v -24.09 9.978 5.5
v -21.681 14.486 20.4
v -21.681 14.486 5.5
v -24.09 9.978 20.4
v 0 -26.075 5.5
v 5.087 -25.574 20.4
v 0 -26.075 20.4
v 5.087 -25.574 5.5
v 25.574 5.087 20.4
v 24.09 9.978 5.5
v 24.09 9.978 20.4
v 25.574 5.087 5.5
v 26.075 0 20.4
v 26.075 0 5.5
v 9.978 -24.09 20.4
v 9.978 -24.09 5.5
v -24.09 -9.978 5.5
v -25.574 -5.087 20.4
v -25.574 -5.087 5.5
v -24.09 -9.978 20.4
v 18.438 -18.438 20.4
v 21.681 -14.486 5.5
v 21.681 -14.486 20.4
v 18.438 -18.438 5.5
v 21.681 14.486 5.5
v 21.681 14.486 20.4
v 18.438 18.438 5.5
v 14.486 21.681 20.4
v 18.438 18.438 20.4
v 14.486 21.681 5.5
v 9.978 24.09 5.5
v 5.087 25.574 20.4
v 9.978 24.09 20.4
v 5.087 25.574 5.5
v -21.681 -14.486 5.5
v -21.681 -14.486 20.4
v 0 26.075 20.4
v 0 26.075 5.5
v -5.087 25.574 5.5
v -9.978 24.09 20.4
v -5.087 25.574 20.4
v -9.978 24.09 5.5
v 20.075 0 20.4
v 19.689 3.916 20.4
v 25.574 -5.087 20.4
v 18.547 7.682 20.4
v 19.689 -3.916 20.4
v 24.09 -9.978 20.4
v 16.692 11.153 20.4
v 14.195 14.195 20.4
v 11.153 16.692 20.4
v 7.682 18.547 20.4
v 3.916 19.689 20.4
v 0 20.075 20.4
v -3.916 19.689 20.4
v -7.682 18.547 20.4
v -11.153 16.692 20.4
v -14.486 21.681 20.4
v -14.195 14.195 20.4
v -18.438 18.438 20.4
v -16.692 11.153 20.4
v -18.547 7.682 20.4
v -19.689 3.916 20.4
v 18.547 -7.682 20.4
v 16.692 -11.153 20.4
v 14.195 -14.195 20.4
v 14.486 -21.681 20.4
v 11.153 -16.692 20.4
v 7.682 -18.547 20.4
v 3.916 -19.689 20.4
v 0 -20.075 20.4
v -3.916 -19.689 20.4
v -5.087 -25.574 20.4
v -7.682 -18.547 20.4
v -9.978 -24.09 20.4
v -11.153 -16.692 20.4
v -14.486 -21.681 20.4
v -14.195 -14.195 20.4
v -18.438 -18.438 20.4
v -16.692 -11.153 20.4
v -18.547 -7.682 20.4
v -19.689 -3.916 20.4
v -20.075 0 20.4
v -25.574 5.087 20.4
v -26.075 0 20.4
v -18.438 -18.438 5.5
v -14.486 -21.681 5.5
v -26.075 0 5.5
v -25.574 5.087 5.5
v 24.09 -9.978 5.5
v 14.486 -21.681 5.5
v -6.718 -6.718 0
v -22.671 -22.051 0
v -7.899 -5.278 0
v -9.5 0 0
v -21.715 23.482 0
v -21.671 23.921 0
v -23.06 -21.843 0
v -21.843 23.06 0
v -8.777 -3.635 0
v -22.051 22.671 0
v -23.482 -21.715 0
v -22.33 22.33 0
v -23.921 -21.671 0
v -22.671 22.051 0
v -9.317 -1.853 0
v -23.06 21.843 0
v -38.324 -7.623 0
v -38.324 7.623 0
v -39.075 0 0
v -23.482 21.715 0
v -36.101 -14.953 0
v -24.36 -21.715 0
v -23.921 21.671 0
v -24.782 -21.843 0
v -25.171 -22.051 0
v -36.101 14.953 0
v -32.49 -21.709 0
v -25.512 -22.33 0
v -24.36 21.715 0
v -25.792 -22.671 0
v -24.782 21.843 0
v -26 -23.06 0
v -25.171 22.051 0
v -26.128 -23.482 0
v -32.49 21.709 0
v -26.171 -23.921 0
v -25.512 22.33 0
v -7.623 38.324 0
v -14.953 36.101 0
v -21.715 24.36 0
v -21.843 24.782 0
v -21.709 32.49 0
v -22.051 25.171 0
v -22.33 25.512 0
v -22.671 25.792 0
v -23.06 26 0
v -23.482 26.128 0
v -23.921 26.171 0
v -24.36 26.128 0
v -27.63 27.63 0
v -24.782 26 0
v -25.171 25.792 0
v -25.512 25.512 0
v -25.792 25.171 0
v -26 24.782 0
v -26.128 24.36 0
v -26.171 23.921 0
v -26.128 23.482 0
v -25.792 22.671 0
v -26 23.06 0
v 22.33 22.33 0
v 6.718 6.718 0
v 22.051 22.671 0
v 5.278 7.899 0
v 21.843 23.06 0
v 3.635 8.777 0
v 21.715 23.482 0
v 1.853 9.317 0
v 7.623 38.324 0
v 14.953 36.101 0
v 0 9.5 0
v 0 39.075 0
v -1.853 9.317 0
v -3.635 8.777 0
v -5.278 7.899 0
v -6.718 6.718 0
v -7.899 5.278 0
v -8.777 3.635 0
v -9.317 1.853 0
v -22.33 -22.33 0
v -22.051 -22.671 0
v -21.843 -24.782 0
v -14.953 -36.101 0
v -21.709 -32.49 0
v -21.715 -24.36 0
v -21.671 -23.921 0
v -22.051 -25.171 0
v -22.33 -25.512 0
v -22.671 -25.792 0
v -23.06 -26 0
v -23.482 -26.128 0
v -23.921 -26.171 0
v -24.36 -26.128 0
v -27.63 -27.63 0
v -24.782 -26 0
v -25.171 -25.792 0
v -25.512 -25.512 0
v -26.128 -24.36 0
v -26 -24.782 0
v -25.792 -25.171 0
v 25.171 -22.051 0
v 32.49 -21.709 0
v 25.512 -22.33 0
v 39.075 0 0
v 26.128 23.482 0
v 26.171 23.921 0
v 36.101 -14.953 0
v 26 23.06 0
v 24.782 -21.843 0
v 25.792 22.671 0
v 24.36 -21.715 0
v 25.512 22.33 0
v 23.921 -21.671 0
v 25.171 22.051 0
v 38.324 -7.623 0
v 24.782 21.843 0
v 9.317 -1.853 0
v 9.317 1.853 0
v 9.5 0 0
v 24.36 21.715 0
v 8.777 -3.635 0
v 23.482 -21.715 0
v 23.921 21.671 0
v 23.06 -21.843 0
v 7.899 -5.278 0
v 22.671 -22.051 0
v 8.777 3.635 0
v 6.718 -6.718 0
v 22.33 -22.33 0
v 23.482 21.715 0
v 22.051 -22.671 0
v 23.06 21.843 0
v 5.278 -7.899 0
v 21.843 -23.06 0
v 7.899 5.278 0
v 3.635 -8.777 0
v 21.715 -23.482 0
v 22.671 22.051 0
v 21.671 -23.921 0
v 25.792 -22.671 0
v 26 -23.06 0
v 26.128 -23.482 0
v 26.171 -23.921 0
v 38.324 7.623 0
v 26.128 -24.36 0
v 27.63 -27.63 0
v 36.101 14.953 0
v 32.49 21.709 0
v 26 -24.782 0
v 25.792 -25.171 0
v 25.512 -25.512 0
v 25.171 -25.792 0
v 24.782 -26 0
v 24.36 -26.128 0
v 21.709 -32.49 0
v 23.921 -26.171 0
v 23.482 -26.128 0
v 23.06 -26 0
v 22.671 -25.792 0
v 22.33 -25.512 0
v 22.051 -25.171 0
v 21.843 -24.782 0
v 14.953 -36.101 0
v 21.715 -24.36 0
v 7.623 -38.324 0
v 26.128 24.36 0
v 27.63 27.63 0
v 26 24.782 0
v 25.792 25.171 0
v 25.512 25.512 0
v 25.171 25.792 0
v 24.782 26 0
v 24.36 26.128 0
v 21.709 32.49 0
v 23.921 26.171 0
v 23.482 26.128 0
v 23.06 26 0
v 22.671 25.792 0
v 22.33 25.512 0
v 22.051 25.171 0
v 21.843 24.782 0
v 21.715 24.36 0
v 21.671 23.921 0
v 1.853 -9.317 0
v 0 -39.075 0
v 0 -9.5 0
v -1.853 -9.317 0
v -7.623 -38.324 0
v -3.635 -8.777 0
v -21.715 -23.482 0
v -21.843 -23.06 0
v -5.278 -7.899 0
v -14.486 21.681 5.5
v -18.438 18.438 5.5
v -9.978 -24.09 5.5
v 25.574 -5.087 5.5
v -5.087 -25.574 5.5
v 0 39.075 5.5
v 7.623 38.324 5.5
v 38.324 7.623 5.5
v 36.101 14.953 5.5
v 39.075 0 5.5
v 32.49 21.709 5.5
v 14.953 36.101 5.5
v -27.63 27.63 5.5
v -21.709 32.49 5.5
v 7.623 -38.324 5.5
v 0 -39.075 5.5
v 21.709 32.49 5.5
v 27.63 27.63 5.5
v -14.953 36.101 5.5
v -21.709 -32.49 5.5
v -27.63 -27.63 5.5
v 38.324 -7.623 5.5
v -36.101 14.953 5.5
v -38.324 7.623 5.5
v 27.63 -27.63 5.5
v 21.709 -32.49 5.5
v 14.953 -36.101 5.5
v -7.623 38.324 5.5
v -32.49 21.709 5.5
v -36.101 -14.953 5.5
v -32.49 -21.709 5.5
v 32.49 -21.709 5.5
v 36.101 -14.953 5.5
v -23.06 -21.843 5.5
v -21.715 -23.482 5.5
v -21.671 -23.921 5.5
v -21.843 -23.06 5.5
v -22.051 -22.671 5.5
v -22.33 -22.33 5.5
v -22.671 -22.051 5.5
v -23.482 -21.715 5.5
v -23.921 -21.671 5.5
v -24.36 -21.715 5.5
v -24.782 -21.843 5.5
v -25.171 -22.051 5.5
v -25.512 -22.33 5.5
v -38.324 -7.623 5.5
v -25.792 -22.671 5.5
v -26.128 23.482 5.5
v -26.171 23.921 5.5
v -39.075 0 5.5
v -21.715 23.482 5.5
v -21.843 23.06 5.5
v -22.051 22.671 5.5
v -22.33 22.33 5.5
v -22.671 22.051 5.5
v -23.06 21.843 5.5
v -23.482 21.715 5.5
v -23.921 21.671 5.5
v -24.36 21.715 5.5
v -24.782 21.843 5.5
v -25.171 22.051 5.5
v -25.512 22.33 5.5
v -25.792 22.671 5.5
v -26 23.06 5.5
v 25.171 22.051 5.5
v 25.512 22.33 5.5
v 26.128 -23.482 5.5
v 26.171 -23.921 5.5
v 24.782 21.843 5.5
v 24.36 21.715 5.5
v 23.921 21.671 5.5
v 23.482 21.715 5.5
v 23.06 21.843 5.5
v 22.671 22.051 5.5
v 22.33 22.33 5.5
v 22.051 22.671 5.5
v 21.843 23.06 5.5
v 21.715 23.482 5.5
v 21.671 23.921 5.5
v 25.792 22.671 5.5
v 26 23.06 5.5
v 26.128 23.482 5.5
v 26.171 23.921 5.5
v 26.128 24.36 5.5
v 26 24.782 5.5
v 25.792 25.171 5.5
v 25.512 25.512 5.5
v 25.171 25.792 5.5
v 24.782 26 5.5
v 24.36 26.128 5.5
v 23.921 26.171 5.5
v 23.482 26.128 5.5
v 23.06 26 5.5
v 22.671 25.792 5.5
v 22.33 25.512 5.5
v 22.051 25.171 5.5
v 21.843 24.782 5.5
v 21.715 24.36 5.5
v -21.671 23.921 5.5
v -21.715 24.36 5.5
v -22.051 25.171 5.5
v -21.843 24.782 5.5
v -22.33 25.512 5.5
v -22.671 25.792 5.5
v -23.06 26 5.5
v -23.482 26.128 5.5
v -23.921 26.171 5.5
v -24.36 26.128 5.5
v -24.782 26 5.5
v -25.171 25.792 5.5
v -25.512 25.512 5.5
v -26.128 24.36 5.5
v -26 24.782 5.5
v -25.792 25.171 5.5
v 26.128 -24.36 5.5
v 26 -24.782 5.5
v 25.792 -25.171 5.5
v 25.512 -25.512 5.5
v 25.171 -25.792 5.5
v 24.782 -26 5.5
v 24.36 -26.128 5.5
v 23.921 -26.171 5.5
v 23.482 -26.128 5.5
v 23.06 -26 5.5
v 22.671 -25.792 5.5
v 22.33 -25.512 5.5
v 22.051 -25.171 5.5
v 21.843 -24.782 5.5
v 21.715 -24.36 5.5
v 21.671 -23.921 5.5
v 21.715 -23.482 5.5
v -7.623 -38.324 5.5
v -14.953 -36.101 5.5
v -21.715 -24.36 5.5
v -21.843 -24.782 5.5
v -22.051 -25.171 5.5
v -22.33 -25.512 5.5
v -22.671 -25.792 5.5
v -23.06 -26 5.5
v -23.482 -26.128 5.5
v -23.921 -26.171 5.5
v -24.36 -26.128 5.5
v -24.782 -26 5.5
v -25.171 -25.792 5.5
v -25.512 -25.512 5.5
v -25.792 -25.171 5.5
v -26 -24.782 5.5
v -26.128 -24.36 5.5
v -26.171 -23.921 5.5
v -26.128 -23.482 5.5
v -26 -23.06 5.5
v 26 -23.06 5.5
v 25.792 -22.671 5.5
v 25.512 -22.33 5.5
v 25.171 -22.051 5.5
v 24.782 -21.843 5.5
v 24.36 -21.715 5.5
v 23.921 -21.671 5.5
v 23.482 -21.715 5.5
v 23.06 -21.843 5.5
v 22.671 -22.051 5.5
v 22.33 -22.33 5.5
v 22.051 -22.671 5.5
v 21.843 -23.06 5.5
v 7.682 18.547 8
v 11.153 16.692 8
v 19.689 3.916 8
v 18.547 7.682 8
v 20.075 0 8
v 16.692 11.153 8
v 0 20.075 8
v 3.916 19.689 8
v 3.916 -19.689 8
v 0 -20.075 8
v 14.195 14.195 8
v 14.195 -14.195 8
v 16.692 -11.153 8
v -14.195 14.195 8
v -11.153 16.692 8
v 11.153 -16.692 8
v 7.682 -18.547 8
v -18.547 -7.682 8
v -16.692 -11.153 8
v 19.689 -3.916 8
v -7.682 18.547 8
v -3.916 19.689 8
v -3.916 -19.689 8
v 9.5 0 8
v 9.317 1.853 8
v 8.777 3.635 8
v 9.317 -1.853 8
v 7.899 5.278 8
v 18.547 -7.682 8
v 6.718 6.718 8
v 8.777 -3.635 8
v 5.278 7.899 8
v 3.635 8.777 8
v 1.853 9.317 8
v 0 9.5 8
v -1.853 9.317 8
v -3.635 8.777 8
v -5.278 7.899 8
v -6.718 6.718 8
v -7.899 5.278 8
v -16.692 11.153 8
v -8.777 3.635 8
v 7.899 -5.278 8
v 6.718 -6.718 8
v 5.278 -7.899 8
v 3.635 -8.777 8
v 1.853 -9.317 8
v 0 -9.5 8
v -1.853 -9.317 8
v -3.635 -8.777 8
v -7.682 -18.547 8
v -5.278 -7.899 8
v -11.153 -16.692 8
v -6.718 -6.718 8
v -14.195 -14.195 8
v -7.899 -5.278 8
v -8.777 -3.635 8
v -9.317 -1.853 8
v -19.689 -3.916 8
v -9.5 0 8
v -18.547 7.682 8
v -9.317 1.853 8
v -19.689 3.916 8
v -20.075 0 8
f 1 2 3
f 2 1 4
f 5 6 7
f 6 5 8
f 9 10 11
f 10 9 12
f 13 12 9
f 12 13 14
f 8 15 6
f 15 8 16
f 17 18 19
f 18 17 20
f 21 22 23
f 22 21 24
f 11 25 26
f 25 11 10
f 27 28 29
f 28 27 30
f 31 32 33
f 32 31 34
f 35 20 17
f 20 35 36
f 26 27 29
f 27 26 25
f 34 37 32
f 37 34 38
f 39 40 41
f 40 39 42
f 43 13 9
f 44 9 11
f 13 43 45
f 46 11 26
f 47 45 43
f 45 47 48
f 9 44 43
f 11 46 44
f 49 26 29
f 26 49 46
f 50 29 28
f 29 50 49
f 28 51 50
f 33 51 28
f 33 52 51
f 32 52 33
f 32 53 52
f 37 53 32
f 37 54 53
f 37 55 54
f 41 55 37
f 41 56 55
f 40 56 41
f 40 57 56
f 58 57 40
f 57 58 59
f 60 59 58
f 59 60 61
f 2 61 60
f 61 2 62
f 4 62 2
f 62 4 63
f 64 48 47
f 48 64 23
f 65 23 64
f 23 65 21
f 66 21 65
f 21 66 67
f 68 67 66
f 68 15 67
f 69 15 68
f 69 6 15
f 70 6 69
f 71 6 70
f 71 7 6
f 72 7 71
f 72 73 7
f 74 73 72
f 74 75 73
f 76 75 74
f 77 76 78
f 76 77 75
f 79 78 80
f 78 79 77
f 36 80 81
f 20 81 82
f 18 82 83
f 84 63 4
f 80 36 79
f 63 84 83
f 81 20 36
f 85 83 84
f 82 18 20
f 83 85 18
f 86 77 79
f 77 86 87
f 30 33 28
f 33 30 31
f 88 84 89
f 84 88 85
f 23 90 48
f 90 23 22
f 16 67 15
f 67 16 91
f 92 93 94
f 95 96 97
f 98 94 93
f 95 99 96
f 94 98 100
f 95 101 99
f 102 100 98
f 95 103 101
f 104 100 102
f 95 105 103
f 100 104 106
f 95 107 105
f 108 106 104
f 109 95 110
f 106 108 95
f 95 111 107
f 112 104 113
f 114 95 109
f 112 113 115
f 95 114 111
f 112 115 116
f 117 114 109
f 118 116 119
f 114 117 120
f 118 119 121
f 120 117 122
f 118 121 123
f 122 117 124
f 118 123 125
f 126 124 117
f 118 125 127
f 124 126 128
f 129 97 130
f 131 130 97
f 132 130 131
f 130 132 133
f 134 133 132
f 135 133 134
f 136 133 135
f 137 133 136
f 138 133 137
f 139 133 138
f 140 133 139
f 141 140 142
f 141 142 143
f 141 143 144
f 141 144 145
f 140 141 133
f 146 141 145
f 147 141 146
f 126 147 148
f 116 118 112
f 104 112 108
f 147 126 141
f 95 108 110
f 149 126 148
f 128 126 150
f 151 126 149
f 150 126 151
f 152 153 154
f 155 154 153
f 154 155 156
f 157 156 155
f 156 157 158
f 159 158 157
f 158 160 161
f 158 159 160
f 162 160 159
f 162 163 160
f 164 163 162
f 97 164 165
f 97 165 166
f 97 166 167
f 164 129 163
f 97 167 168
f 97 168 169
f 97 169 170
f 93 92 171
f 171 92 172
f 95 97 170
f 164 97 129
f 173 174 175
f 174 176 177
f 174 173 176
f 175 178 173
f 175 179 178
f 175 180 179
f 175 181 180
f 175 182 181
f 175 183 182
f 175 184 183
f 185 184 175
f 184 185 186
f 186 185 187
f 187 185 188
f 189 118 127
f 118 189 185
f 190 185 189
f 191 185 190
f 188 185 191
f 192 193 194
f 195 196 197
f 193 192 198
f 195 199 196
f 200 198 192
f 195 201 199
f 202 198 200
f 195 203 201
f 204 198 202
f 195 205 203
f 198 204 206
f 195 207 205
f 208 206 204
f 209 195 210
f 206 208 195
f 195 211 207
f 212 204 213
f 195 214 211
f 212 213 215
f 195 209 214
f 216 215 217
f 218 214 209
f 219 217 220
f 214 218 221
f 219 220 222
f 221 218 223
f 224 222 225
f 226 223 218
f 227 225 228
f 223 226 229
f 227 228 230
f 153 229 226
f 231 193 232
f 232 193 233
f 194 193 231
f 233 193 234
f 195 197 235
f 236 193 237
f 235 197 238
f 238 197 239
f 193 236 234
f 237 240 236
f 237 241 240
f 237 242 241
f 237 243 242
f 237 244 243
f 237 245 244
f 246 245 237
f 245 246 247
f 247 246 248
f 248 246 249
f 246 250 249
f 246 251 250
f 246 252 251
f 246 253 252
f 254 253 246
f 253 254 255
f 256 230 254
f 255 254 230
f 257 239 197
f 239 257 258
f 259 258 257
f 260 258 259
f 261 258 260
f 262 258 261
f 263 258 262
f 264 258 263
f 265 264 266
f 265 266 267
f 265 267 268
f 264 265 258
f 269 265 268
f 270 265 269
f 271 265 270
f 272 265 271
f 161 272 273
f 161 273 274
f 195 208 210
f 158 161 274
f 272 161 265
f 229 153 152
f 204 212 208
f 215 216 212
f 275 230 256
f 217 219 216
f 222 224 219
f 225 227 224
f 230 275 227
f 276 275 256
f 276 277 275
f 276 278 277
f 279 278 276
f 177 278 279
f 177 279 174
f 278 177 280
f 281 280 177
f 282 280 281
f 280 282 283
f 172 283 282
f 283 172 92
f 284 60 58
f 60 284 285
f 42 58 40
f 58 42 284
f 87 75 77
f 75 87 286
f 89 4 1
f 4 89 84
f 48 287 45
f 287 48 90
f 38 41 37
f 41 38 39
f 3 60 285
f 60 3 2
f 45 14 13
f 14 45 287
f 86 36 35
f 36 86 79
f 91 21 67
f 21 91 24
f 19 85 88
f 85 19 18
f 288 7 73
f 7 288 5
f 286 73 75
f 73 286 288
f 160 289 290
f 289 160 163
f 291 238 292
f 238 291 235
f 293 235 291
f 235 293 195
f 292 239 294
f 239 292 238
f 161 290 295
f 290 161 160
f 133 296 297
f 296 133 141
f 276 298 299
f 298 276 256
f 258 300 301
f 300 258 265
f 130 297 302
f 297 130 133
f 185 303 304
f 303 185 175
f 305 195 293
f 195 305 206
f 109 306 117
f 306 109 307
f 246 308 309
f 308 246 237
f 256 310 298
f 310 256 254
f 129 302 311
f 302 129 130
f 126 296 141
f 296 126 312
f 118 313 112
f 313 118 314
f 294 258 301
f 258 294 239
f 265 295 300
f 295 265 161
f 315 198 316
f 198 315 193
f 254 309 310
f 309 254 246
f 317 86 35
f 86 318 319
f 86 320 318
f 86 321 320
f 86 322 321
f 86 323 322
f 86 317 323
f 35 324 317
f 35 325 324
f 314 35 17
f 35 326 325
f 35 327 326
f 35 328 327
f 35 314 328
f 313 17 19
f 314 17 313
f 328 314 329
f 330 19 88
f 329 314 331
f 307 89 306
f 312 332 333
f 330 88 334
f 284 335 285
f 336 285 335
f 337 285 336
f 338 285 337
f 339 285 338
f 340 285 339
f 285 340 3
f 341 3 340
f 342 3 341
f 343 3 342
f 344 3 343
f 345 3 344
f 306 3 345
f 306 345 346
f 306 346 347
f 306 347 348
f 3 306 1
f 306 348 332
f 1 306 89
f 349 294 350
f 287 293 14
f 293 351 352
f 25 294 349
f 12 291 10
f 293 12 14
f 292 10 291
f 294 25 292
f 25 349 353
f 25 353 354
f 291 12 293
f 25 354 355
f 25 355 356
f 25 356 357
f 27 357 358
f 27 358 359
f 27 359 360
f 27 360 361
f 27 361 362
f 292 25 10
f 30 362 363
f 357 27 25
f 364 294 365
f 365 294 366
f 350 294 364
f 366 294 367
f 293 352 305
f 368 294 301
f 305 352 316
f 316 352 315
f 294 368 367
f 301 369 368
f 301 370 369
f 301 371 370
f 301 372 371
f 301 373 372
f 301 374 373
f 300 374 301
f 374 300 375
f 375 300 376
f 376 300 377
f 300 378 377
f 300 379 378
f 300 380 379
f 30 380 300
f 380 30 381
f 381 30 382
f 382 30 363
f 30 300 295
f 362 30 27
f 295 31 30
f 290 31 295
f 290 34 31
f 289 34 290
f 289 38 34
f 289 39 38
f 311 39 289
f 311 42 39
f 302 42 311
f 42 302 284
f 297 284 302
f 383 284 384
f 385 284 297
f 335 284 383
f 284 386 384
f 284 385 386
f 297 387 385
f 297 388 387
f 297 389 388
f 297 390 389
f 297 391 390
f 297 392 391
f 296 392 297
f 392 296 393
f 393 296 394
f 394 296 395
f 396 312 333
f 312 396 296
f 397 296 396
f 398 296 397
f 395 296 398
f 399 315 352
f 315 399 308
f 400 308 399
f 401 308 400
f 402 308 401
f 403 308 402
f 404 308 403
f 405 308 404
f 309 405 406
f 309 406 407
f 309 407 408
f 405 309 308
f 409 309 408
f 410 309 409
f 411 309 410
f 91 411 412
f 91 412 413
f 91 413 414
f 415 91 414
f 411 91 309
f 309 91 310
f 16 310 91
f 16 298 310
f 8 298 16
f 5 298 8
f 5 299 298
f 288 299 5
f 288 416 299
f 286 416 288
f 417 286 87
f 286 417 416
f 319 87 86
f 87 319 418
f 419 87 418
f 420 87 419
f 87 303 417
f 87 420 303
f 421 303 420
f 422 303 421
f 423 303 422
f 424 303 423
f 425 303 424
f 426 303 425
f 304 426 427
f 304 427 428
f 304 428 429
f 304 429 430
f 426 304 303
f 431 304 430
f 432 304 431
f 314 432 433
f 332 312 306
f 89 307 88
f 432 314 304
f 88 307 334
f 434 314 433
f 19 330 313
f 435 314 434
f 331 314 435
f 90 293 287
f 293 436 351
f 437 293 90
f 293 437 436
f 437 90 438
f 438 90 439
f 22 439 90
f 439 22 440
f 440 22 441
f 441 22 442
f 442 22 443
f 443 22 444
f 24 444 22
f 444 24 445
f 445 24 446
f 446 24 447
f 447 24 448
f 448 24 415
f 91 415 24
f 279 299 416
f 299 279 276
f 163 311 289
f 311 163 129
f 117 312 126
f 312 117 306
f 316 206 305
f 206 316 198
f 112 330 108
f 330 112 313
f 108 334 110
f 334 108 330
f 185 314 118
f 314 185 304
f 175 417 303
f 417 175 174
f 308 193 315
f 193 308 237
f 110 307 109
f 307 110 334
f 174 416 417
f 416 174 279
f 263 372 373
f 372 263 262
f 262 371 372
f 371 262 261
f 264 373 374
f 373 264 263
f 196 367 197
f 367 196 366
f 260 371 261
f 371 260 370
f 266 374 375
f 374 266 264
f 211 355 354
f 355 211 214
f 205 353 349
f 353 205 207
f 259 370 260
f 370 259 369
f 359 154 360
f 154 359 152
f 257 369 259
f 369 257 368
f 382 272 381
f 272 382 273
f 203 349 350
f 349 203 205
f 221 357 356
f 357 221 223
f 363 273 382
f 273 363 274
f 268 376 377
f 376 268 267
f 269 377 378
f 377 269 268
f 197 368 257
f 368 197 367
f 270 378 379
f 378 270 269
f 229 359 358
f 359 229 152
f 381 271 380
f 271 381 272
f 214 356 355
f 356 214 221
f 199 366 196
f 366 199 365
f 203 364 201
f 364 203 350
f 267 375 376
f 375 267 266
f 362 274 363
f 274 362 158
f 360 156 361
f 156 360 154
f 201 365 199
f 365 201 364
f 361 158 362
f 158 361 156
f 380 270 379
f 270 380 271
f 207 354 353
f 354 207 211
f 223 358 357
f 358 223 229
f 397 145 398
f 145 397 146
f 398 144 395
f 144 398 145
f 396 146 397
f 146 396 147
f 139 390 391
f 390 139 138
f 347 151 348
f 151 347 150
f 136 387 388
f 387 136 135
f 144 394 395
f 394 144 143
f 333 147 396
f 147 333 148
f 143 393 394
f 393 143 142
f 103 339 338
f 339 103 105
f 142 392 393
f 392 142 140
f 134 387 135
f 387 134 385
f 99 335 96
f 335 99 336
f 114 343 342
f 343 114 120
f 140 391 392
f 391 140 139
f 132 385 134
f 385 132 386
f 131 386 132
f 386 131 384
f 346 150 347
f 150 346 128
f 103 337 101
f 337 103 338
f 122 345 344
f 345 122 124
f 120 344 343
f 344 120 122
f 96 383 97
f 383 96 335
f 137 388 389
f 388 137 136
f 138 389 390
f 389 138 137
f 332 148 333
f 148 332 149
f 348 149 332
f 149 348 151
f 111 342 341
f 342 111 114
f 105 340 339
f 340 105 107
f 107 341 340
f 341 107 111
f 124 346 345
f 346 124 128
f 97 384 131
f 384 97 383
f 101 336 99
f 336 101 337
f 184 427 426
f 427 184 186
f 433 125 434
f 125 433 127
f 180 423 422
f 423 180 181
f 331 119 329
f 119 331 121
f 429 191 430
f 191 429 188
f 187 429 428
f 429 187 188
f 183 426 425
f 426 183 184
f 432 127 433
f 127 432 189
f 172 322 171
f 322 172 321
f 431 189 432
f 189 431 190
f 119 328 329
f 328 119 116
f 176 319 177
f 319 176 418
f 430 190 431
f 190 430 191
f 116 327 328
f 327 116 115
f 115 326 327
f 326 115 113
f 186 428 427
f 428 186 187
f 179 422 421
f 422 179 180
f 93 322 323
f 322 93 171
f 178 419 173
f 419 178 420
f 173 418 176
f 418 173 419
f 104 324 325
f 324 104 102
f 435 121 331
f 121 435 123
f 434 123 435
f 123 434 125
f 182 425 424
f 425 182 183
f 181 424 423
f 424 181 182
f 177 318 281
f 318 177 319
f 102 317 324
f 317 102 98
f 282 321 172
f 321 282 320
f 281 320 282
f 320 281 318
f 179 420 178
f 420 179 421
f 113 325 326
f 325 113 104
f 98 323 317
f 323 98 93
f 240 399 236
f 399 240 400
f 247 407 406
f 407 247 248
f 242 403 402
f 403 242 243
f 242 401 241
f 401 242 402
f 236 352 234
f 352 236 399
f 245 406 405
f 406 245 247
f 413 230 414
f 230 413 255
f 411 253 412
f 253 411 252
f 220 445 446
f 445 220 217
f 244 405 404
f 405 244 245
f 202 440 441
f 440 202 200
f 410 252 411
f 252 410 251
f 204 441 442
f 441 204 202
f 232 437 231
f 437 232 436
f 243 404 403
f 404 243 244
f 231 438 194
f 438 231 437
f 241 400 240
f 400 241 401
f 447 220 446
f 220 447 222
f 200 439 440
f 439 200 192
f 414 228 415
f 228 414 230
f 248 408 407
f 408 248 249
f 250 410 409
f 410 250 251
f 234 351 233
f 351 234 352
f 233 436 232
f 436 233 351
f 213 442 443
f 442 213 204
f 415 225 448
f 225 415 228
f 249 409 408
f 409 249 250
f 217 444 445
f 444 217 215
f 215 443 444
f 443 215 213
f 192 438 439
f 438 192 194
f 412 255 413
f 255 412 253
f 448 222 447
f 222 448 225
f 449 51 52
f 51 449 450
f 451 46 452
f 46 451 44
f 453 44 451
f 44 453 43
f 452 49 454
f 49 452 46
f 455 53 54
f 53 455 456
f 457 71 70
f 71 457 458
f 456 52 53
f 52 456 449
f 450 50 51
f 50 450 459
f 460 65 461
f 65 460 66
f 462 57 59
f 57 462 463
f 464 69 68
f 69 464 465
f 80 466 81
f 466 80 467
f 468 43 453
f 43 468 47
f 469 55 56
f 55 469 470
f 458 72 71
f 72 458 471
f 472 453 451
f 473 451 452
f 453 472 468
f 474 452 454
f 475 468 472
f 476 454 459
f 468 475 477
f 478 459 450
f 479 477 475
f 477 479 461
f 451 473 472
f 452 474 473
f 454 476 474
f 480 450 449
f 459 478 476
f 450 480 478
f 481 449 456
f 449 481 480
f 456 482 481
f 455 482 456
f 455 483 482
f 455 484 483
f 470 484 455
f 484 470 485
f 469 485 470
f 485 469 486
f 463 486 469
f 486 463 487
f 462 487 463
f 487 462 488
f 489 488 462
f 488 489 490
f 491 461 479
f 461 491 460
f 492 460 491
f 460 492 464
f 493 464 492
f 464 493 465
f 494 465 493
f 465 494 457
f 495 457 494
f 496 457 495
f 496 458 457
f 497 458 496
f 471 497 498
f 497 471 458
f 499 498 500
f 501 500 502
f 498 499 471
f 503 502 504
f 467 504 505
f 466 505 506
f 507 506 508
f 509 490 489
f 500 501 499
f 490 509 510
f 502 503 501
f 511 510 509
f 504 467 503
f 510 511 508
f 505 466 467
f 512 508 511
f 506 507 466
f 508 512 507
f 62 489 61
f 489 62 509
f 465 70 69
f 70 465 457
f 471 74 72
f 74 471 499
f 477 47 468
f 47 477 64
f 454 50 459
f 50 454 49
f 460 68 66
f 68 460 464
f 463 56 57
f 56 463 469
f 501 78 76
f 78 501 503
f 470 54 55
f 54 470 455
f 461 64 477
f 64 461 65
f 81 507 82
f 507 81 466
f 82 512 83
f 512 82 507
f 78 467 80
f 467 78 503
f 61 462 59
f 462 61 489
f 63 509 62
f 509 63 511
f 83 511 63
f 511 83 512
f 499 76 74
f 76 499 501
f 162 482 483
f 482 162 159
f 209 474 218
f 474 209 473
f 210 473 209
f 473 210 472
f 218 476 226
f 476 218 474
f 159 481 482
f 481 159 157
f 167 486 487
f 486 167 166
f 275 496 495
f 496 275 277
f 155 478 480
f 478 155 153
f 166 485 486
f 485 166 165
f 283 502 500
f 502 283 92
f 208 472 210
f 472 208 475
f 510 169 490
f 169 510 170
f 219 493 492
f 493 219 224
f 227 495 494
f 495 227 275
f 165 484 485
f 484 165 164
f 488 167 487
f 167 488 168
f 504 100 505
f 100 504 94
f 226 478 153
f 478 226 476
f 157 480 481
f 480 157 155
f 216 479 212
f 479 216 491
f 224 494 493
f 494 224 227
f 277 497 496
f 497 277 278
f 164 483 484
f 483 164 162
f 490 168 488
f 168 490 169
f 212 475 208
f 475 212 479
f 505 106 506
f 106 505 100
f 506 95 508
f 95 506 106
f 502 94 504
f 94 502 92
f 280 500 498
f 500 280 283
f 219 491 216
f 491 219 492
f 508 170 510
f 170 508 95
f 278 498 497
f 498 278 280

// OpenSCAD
$fn = 32;

// ----------------------------------------------------------------------
// Bearing housing: seat for 6203 (40 x 12 mm), 52.15 mm body
// ----------------------------------------------------------------------

// --- parameters (mm) ---
case_d = 52.15;           // housing outside diameter
case_h = 20.4;            // overall housing height
rim_t = 6;                // wall thickness
bearing_seat = 40.15;     // 6203 seat, 0.15 mm clearance
seat_h = 12.4;            // pocket depth
shoulder = 4;             // shoulder under the bearing
pass_d = 19;              // shaft passage
ear_d = 78.15;            // mounting flange diameter
flange_t = 4;             // flange thickness
bolt_d = 4.5;             // flange bolt clearance
bolt_r = 33.83;           // flange bolt circle radius

module body() {
  cylinder(h = case_h, d = case_d);
}

module flange() {
  /* flange sunk 1.5 mm into the body */
  cylinder(h = flange_t + 1.5, d = ear_d);
}

difference() {
  union() {
    body();
    flange();
  }
  translate([0, 0, case_h - seat_h]) cylinder(h = seat_h + 1, d = bearing_seat);
  translate([0, 0, -1]) cylinder(h = case_h - seat_h + 1, d = pass_d);
  for (i = [0 : 3]) rotate([0, 0, 45 + i * 90]) translate([bolt_r, 0, -1])
    cylinder(h = flange_t + 3, d = bolt_d);
}
